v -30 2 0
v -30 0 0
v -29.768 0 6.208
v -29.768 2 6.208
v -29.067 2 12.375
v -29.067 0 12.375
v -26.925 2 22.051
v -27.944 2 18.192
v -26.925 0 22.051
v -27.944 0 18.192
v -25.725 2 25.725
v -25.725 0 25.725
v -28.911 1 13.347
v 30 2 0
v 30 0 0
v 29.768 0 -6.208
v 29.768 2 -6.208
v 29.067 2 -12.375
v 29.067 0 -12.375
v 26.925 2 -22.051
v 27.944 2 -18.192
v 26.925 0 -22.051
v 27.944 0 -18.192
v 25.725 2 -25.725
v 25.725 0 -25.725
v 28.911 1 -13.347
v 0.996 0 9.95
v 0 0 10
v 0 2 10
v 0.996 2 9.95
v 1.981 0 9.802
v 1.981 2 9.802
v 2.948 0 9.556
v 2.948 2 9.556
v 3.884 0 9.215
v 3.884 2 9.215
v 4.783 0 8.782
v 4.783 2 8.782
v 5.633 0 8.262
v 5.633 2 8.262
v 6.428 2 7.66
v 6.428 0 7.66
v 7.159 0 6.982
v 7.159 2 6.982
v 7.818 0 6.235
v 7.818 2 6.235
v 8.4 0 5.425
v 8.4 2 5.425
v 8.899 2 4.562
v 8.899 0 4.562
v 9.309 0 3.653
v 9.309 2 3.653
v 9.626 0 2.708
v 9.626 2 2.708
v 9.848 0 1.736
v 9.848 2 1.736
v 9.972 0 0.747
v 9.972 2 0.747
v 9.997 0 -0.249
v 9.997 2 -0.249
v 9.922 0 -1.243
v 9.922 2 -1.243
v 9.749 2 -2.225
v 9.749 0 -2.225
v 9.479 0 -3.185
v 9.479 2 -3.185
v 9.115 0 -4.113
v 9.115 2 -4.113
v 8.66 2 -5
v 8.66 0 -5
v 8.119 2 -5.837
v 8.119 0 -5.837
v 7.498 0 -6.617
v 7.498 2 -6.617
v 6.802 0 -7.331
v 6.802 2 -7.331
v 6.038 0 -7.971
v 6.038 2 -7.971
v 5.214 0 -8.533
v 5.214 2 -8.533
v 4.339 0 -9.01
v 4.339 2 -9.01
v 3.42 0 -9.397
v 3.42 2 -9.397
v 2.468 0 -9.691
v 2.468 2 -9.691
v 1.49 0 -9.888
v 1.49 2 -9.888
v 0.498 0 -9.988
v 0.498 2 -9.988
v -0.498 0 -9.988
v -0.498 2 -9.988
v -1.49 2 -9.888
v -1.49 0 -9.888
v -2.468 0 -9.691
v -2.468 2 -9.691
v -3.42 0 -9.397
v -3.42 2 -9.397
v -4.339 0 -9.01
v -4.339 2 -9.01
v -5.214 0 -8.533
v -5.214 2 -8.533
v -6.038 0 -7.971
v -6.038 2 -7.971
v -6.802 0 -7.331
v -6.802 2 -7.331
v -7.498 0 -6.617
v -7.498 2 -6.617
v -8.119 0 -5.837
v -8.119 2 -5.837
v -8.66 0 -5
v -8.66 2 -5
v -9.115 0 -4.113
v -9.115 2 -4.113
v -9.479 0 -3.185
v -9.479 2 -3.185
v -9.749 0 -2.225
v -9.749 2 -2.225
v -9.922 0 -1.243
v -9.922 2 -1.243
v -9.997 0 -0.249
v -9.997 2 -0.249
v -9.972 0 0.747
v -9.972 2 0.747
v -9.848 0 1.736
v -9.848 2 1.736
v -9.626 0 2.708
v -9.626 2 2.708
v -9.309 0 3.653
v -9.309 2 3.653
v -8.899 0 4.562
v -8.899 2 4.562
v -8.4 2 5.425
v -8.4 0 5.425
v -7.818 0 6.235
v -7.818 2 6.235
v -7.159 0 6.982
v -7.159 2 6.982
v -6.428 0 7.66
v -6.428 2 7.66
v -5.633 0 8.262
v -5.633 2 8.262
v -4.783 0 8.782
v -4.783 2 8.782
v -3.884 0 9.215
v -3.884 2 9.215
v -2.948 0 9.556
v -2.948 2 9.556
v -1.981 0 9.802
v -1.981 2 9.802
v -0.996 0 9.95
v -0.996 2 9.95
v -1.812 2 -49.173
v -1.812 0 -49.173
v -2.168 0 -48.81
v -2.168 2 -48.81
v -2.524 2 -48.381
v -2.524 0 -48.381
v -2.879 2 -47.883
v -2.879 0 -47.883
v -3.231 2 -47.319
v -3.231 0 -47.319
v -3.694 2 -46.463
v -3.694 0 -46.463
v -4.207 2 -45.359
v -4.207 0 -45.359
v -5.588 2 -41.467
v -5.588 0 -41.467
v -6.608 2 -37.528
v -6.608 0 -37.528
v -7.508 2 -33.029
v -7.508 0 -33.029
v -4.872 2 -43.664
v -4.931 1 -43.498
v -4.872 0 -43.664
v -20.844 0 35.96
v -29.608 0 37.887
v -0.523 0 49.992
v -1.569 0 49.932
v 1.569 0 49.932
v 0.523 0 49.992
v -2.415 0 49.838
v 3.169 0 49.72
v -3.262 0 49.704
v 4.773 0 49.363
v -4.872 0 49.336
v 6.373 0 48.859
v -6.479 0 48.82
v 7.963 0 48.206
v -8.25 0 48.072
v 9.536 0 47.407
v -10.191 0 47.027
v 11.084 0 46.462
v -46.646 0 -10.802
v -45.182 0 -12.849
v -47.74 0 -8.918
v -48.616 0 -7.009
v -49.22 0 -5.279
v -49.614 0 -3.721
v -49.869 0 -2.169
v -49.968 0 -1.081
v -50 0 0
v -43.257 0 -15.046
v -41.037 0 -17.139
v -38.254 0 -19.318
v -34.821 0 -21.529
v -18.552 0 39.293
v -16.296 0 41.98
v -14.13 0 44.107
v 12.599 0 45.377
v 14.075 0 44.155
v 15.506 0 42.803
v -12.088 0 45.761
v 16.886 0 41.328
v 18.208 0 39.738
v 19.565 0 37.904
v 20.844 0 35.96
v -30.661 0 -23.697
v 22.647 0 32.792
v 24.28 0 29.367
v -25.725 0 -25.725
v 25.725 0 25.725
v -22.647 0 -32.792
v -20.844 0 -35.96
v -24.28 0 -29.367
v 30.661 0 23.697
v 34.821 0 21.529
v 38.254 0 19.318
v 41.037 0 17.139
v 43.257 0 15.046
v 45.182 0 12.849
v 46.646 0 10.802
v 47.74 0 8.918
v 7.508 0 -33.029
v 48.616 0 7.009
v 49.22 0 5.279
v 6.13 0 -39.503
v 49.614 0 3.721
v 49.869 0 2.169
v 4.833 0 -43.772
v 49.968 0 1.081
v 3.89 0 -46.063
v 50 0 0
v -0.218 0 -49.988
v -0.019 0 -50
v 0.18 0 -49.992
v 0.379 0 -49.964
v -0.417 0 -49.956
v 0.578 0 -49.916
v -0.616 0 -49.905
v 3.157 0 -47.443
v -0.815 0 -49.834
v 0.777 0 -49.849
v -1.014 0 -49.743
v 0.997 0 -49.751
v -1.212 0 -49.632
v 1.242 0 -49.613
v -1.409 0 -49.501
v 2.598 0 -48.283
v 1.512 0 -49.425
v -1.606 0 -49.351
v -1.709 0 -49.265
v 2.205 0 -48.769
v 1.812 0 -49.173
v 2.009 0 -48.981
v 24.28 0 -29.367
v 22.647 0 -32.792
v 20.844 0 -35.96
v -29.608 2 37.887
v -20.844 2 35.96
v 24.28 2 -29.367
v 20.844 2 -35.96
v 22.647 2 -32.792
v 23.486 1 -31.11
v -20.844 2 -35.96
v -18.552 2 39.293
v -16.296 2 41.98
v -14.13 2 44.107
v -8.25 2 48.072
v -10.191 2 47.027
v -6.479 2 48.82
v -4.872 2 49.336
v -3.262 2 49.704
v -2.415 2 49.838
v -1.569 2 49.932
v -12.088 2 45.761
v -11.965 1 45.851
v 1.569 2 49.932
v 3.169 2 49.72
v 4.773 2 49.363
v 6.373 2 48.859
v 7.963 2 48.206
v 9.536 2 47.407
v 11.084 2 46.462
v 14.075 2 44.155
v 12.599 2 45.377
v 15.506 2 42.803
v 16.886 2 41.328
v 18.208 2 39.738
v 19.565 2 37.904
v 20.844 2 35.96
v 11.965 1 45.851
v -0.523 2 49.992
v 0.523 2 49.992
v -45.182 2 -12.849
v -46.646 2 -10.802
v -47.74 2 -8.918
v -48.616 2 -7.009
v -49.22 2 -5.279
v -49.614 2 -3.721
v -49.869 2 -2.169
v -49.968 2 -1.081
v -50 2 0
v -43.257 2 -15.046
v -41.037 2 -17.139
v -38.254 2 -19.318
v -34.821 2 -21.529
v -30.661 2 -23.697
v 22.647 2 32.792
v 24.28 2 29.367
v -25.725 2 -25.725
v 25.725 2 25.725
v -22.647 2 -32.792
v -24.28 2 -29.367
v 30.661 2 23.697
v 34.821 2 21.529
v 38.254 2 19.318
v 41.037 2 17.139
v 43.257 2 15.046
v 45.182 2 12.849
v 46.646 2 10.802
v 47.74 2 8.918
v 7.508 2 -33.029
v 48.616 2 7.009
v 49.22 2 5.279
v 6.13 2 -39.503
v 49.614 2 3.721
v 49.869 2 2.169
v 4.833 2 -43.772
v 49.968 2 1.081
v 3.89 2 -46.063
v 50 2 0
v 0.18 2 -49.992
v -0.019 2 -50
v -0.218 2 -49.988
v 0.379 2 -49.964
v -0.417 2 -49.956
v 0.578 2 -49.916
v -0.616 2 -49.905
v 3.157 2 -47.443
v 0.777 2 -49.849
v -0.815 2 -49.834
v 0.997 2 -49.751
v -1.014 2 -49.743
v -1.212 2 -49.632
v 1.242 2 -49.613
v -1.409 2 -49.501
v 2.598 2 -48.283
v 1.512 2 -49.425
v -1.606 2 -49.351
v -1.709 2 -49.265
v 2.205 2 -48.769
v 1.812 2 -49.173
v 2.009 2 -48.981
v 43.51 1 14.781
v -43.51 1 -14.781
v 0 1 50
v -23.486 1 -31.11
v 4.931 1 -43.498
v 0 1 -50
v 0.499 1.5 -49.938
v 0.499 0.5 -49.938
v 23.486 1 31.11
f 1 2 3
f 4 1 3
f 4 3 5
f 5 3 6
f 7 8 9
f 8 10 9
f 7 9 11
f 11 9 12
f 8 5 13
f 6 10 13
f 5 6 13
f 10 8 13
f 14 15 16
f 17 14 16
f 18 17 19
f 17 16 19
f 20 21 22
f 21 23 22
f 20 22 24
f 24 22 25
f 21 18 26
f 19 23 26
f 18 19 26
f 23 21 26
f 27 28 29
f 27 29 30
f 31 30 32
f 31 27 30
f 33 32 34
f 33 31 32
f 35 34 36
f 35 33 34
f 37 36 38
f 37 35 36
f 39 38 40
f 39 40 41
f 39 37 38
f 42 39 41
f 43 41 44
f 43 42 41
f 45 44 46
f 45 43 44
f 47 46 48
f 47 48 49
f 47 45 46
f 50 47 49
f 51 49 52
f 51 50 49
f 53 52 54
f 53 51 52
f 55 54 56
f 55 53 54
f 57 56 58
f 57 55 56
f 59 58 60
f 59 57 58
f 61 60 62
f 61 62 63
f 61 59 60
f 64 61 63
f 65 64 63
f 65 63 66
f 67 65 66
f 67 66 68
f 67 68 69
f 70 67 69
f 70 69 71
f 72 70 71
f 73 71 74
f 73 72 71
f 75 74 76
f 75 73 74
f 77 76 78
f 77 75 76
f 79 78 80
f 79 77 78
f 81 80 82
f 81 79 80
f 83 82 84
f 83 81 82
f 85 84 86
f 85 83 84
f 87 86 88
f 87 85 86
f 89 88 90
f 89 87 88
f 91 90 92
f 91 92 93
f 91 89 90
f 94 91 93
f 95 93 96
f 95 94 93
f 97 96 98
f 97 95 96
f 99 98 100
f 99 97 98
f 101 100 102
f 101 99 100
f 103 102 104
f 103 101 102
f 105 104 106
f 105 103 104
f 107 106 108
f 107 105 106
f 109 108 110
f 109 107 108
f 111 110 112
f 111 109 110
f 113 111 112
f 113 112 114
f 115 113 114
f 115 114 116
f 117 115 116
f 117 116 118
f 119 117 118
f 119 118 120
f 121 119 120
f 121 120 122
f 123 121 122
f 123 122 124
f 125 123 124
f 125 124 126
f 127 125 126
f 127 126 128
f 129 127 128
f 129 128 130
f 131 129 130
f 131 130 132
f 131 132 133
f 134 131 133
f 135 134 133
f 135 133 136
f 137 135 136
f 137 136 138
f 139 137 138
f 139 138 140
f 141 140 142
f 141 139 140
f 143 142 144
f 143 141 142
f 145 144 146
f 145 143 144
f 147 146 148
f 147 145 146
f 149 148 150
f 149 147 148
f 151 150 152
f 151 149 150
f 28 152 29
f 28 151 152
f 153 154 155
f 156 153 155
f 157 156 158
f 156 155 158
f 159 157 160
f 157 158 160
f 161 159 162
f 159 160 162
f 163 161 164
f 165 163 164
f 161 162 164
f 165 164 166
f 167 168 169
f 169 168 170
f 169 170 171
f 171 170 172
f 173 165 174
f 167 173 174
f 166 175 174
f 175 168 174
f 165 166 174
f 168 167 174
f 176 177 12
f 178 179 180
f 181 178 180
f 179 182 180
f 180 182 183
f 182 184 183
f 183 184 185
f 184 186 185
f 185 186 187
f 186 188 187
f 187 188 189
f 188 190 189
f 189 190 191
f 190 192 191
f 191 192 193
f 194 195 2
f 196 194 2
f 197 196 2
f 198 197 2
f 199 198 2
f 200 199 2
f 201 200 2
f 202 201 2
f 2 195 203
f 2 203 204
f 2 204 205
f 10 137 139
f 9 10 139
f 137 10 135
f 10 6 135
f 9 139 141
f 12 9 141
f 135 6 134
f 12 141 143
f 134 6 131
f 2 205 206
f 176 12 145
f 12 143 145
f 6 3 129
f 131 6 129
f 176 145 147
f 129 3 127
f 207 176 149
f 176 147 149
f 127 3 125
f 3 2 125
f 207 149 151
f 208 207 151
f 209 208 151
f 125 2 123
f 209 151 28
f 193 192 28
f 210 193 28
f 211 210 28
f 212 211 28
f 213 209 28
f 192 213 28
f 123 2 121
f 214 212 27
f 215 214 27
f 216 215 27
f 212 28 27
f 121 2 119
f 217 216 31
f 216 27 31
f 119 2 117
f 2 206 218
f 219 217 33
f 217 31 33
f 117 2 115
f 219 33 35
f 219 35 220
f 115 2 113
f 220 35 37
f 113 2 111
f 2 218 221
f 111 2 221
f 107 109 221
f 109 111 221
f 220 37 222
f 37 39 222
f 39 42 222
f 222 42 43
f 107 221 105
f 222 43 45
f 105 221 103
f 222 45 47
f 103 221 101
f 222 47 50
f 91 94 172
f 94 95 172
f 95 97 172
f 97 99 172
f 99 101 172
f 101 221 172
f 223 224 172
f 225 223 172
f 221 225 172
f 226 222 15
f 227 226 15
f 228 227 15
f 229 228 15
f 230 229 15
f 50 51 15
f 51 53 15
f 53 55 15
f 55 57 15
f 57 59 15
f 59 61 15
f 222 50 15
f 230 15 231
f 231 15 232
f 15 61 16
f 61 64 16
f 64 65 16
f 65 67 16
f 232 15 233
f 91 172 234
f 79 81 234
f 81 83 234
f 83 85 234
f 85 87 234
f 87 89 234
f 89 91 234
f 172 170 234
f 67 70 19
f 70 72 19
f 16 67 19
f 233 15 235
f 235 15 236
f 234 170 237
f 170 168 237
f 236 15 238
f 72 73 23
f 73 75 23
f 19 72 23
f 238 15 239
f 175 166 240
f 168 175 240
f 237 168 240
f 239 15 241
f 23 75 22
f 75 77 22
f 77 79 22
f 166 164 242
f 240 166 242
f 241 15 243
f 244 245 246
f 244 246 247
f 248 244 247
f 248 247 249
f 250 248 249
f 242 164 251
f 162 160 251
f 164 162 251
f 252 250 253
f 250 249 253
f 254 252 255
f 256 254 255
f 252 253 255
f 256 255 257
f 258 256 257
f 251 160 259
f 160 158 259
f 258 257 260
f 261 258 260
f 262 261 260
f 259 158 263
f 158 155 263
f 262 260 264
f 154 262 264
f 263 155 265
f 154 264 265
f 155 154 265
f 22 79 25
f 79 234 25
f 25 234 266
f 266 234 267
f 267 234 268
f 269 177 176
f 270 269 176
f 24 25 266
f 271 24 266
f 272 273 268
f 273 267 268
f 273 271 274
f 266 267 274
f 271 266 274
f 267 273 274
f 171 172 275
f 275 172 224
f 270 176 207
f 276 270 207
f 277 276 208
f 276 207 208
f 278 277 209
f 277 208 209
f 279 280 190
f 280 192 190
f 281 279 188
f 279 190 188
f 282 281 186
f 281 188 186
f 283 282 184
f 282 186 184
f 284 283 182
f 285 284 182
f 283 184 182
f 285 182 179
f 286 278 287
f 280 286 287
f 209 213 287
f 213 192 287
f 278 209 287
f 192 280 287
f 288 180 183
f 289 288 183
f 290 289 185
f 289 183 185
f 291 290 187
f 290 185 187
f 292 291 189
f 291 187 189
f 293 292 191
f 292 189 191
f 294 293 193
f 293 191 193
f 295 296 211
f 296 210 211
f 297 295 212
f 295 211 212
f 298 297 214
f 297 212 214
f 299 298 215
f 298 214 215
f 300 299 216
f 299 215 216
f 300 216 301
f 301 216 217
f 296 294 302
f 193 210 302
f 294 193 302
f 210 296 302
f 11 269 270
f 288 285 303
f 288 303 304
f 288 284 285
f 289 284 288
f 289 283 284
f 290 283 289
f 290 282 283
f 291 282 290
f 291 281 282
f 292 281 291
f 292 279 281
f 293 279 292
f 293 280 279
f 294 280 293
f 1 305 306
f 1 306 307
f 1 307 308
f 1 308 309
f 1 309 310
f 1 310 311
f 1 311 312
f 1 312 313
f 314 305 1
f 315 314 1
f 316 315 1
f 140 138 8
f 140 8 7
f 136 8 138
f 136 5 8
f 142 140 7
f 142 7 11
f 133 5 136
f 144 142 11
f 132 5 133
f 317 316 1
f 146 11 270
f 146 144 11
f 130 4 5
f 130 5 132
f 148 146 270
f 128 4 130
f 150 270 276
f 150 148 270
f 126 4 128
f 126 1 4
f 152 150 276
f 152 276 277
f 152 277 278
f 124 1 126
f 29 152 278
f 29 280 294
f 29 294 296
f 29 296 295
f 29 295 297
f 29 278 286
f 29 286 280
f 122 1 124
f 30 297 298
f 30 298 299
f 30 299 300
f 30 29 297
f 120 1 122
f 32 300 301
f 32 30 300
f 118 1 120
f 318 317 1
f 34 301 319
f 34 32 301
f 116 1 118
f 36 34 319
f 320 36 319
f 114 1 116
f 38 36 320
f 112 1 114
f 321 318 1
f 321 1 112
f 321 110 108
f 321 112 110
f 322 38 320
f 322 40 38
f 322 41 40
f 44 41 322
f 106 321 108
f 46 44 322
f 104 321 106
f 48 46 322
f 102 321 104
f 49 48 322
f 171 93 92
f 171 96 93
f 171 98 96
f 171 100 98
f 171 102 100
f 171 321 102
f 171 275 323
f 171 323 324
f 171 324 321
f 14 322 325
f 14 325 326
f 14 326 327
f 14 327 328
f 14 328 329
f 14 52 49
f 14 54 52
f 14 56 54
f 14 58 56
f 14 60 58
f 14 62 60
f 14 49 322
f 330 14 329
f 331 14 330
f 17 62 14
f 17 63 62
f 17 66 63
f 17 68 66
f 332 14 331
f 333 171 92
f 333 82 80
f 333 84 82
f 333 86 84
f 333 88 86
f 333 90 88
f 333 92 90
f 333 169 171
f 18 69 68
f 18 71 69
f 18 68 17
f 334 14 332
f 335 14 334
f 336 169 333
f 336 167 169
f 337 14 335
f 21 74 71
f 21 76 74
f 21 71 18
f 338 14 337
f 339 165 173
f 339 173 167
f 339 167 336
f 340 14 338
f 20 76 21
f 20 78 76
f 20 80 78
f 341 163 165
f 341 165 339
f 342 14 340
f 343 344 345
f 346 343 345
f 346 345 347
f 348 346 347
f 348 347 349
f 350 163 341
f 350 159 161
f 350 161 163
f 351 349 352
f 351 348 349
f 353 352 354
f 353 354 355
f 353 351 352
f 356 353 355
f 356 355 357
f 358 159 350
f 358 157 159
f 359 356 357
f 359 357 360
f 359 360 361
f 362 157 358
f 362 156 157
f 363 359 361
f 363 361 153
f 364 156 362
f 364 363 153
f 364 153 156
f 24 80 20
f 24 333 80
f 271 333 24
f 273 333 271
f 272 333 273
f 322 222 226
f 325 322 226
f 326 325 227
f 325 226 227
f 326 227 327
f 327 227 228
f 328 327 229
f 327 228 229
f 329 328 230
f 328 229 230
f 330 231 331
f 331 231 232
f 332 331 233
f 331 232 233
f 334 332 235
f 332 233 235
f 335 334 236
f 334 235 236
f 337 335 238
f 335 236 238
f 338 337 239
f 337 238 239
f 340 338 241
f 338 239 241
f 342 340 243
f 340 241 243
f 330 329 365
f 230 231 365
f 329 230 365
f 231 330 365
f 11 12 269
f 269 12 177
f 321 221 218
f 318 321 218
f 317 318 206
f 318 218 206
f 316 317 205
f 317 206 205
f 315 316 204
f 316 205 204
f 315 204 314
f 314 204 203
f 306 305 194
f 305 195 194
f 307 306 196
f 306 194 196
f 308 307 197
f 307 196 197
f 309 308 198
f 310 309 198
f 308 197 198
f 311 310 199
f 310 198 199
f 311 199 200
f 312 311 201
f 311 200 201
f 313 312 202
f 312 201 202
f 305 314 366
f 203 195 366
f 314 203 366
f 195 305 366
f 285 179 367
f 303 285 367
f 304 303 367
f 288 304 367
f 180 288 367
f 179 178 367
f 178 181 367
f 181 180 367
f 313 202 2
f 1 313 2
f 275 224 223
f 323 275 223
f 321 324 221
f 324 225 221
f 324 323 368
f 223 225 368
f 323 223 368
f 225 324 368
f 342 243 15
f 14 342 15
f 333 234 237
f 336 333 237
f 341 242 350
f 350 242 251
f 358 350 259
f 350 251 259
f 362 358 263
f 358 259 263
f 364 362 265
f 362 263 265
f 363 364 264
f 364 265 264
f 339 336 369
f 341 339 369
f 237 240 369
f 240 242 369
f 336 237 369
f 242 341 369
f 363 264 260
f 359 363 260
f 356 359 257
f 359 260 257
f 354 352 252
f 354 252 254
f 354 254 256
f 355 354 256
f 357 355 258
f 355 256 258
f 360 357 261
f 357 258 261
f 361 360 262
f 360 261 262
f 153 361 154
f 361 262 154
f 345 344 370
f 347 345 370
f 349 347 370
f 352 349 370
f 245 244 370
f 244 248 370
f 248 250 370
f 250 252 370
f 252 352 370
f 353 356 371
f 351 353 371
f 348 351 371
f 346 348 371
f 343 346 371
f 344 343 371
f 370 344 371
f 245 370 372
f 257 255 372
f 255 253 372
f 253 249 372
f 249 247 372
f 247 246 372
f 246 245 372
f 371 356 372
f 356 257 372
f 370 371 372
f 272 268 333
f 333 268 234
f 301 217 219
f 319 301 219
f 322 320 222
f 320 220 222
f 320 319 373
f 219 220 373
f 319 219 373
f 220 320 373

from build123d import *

# Parameters (mm, degrees)
SZKIC1_R                    = 10
DODANIE_WYCI_GNI_CIE1_DEPTH = 2


with BuildPart() as part:
    # Szkic1 → Dodanie-wyciągnięcie1 (new body)
    with BuildSketch(Plane(origin=(0, 0, 0), x_dir=(1, 0, 0), z_dir=(0, 1, 0))):
        with BuildLine():
            add(Edge.make_bspline(
                [(20.843852414, -35.960387795), (23.68927397, -31.378992774), (25.724787771, -25.724787771)],
                knots=[0.768134938, 0.768134938, 0.768134938, 1.030376827, 1.030376827, 1.030376827], degree=2, weights=[1, 0.991415958, 1]))
            add(Edge.make_bspline(
                [(25.724787771, -25.724787771), (50, -16.985711369), (50, 0)],
                knots=[5.252808481, 5.252808481, 5.252808481, 6.283185307, 6.283185307, 6.283185307], degree=2, weights=[1, 0.870199907, 1]))
            Line((50, 0), (30, 0))
            add(Edge.make_bspline(
                [(30, 0), (30, 13.849198247), (25.724787771, 25.724787771)],
                knots=[1.570796327, 1.570796327, 1.570796327, 2.111215827, 2.111215827, 2.111215827], degree=2, weights=[1, 0.963714928, 1]))
            add(Edge.make_bspline(
                [(25.724787771, 25.724787771), (23.68927397, 31.378992774), (20.843852414, 35.960387795)],
                knots=[2.111215827, 2.111215827, 2.111215827, 2.373457716, 2.373457716, 2.373457716], degree=2, weights=[1, 0.991415958, 1]))
            Line((20.843852414, 35.960387795), (7.507535684, 33.029118956))
            add(Edge.make_bspline(
                [(7.507535684, 33.029118956), (5.218865934, 46.034514162), (1.811566447, 49.17271271)],
                knots=[5.433983203, 5.433983203, 5.433983203, 6.101022879, 6.101022879, 6.101022879], degree=2, weights=[1, 0.944895907, 1]))
            add(Edge.make_bspline(
                [(1.811566447, 49.17271271), (0.913339162, 50), (0, 50)],
                knots=[6.101022879, 6.101022879, 6.101022879, 6.283185307, 6.283185307, 6.283185307], degree=2, weights=[1, 0.995854973, 1]))
            add(Edge.make_bspline(
                [(0, 50), (-0.913339162, 50), (-1.811566447, 49.17271271)],
                knots=[0, 0, 0, 0.182162428, 0.182162428, 0.182162428], degree=2, weights=[1, 0.995854973, 1]))
            add(Edge.make_bspline(
                [(-1.811566447, 49.17271271), (-5.218865934, 46.034514162), (-7.507535684, 33.029118956)],
                knots=[0.182162428, 0.182162428, 0.182162428, 0.849202104, 0.849202104, 0.849202104], degree=2, weights=[1, 0.944895907, 1]))
            Line((-7.507535684, 33.029118956), (-20.843852414, 35.960387795))
            add(Edge.make_bspline(
                [(-20.843852414, 35.960387795), (-23.68927397, 31.378992774), (-25.724787771, 25.724787771)],
                knots=[3.909727591, 3.909727591, 3.909727591, 4.17196948, 4.17196948, 4.17196948], degree=2, weights=[1, 0.991415958, 1]))
            add(Edge.make_bspline(
                [(-25.724787771, 25.724787771), (-50, 16.985711369), (-50, 0)],
                knots=[2.111215827, 2.111215827, 2.111215827, 3.141592654, 3.141592654, 3.141592654], degree=2, weights=[1, 0.870199907, 1]))
            Line((-50, 0), (-30, 0))
            add(Edge.make_bspline(
                [(-30, 9.5e-08), (-30.000000016, -13.849198204), (-25.724787771, -25.724787771)],
                knots=[4.712388978, 4.712388978, 4.712388978, 5.252808481, 5.252808481, 5.252808481], degree=2, weights=[1, 0.963714928, 1]))
            Line((-25.724787771, -25.724787771), (-29.607826273, -37.88667404))
            Line((-29.607826273, -37.88667404), (-20.843852414, -35.960387795))
            add(Edge.make_bspline(
                [(-20.843852414, -35.960387795), (-12.774167321, -48.953336072), (-1.56928672, -49.931545896)],
                knots=[5.51505037, 5.51505037, 5.51505037, 6.230851865, 6.230851865, 6.230851865], degree=2, weights=[1, 0.936634273, 1]))
            add(Edge.make_bspline(
                [(-1.56928672, -49.931545896), (-0.785180849, -50), (0, -50)],
                knots=[6.230851865, 6.230851865, 6.230851865, 6.283185307, 6.283185307, 6.283185307], degree=2, weights=[1, 0.999657671, 1]))
            add(Edge.make_bspline(
                [(0, -50), (0.785180849, -50), (1.56928672, -49.931545896)],
                knots=[0, 0, 0, 0.052333442, 0.052333442, 0.052333442], degree=2, weights=[1, 0.999657671, 1]))
            add(Edge.make_bspline(
                [(1.56928672, -49.931545896), (12.774167321, -48.953336072), (20.843852414, -35.960387795)],
                knots=[0.052333442, 0.052333442, 0.052333442, 0.768134938, 0.768134938, 0.768134938], degree=2, weights=[1, 0.936634273, 1]))
        make_face()
        with Locations(Location((0, 0, 0), (0, 0, 270))):
            Circle(SZKIC1_R, mode=Mode.SUBTRACT)
    extrude(amount=DODANIE_WYCI_GNI_CIE1_DEPTH)


solid = part.part
